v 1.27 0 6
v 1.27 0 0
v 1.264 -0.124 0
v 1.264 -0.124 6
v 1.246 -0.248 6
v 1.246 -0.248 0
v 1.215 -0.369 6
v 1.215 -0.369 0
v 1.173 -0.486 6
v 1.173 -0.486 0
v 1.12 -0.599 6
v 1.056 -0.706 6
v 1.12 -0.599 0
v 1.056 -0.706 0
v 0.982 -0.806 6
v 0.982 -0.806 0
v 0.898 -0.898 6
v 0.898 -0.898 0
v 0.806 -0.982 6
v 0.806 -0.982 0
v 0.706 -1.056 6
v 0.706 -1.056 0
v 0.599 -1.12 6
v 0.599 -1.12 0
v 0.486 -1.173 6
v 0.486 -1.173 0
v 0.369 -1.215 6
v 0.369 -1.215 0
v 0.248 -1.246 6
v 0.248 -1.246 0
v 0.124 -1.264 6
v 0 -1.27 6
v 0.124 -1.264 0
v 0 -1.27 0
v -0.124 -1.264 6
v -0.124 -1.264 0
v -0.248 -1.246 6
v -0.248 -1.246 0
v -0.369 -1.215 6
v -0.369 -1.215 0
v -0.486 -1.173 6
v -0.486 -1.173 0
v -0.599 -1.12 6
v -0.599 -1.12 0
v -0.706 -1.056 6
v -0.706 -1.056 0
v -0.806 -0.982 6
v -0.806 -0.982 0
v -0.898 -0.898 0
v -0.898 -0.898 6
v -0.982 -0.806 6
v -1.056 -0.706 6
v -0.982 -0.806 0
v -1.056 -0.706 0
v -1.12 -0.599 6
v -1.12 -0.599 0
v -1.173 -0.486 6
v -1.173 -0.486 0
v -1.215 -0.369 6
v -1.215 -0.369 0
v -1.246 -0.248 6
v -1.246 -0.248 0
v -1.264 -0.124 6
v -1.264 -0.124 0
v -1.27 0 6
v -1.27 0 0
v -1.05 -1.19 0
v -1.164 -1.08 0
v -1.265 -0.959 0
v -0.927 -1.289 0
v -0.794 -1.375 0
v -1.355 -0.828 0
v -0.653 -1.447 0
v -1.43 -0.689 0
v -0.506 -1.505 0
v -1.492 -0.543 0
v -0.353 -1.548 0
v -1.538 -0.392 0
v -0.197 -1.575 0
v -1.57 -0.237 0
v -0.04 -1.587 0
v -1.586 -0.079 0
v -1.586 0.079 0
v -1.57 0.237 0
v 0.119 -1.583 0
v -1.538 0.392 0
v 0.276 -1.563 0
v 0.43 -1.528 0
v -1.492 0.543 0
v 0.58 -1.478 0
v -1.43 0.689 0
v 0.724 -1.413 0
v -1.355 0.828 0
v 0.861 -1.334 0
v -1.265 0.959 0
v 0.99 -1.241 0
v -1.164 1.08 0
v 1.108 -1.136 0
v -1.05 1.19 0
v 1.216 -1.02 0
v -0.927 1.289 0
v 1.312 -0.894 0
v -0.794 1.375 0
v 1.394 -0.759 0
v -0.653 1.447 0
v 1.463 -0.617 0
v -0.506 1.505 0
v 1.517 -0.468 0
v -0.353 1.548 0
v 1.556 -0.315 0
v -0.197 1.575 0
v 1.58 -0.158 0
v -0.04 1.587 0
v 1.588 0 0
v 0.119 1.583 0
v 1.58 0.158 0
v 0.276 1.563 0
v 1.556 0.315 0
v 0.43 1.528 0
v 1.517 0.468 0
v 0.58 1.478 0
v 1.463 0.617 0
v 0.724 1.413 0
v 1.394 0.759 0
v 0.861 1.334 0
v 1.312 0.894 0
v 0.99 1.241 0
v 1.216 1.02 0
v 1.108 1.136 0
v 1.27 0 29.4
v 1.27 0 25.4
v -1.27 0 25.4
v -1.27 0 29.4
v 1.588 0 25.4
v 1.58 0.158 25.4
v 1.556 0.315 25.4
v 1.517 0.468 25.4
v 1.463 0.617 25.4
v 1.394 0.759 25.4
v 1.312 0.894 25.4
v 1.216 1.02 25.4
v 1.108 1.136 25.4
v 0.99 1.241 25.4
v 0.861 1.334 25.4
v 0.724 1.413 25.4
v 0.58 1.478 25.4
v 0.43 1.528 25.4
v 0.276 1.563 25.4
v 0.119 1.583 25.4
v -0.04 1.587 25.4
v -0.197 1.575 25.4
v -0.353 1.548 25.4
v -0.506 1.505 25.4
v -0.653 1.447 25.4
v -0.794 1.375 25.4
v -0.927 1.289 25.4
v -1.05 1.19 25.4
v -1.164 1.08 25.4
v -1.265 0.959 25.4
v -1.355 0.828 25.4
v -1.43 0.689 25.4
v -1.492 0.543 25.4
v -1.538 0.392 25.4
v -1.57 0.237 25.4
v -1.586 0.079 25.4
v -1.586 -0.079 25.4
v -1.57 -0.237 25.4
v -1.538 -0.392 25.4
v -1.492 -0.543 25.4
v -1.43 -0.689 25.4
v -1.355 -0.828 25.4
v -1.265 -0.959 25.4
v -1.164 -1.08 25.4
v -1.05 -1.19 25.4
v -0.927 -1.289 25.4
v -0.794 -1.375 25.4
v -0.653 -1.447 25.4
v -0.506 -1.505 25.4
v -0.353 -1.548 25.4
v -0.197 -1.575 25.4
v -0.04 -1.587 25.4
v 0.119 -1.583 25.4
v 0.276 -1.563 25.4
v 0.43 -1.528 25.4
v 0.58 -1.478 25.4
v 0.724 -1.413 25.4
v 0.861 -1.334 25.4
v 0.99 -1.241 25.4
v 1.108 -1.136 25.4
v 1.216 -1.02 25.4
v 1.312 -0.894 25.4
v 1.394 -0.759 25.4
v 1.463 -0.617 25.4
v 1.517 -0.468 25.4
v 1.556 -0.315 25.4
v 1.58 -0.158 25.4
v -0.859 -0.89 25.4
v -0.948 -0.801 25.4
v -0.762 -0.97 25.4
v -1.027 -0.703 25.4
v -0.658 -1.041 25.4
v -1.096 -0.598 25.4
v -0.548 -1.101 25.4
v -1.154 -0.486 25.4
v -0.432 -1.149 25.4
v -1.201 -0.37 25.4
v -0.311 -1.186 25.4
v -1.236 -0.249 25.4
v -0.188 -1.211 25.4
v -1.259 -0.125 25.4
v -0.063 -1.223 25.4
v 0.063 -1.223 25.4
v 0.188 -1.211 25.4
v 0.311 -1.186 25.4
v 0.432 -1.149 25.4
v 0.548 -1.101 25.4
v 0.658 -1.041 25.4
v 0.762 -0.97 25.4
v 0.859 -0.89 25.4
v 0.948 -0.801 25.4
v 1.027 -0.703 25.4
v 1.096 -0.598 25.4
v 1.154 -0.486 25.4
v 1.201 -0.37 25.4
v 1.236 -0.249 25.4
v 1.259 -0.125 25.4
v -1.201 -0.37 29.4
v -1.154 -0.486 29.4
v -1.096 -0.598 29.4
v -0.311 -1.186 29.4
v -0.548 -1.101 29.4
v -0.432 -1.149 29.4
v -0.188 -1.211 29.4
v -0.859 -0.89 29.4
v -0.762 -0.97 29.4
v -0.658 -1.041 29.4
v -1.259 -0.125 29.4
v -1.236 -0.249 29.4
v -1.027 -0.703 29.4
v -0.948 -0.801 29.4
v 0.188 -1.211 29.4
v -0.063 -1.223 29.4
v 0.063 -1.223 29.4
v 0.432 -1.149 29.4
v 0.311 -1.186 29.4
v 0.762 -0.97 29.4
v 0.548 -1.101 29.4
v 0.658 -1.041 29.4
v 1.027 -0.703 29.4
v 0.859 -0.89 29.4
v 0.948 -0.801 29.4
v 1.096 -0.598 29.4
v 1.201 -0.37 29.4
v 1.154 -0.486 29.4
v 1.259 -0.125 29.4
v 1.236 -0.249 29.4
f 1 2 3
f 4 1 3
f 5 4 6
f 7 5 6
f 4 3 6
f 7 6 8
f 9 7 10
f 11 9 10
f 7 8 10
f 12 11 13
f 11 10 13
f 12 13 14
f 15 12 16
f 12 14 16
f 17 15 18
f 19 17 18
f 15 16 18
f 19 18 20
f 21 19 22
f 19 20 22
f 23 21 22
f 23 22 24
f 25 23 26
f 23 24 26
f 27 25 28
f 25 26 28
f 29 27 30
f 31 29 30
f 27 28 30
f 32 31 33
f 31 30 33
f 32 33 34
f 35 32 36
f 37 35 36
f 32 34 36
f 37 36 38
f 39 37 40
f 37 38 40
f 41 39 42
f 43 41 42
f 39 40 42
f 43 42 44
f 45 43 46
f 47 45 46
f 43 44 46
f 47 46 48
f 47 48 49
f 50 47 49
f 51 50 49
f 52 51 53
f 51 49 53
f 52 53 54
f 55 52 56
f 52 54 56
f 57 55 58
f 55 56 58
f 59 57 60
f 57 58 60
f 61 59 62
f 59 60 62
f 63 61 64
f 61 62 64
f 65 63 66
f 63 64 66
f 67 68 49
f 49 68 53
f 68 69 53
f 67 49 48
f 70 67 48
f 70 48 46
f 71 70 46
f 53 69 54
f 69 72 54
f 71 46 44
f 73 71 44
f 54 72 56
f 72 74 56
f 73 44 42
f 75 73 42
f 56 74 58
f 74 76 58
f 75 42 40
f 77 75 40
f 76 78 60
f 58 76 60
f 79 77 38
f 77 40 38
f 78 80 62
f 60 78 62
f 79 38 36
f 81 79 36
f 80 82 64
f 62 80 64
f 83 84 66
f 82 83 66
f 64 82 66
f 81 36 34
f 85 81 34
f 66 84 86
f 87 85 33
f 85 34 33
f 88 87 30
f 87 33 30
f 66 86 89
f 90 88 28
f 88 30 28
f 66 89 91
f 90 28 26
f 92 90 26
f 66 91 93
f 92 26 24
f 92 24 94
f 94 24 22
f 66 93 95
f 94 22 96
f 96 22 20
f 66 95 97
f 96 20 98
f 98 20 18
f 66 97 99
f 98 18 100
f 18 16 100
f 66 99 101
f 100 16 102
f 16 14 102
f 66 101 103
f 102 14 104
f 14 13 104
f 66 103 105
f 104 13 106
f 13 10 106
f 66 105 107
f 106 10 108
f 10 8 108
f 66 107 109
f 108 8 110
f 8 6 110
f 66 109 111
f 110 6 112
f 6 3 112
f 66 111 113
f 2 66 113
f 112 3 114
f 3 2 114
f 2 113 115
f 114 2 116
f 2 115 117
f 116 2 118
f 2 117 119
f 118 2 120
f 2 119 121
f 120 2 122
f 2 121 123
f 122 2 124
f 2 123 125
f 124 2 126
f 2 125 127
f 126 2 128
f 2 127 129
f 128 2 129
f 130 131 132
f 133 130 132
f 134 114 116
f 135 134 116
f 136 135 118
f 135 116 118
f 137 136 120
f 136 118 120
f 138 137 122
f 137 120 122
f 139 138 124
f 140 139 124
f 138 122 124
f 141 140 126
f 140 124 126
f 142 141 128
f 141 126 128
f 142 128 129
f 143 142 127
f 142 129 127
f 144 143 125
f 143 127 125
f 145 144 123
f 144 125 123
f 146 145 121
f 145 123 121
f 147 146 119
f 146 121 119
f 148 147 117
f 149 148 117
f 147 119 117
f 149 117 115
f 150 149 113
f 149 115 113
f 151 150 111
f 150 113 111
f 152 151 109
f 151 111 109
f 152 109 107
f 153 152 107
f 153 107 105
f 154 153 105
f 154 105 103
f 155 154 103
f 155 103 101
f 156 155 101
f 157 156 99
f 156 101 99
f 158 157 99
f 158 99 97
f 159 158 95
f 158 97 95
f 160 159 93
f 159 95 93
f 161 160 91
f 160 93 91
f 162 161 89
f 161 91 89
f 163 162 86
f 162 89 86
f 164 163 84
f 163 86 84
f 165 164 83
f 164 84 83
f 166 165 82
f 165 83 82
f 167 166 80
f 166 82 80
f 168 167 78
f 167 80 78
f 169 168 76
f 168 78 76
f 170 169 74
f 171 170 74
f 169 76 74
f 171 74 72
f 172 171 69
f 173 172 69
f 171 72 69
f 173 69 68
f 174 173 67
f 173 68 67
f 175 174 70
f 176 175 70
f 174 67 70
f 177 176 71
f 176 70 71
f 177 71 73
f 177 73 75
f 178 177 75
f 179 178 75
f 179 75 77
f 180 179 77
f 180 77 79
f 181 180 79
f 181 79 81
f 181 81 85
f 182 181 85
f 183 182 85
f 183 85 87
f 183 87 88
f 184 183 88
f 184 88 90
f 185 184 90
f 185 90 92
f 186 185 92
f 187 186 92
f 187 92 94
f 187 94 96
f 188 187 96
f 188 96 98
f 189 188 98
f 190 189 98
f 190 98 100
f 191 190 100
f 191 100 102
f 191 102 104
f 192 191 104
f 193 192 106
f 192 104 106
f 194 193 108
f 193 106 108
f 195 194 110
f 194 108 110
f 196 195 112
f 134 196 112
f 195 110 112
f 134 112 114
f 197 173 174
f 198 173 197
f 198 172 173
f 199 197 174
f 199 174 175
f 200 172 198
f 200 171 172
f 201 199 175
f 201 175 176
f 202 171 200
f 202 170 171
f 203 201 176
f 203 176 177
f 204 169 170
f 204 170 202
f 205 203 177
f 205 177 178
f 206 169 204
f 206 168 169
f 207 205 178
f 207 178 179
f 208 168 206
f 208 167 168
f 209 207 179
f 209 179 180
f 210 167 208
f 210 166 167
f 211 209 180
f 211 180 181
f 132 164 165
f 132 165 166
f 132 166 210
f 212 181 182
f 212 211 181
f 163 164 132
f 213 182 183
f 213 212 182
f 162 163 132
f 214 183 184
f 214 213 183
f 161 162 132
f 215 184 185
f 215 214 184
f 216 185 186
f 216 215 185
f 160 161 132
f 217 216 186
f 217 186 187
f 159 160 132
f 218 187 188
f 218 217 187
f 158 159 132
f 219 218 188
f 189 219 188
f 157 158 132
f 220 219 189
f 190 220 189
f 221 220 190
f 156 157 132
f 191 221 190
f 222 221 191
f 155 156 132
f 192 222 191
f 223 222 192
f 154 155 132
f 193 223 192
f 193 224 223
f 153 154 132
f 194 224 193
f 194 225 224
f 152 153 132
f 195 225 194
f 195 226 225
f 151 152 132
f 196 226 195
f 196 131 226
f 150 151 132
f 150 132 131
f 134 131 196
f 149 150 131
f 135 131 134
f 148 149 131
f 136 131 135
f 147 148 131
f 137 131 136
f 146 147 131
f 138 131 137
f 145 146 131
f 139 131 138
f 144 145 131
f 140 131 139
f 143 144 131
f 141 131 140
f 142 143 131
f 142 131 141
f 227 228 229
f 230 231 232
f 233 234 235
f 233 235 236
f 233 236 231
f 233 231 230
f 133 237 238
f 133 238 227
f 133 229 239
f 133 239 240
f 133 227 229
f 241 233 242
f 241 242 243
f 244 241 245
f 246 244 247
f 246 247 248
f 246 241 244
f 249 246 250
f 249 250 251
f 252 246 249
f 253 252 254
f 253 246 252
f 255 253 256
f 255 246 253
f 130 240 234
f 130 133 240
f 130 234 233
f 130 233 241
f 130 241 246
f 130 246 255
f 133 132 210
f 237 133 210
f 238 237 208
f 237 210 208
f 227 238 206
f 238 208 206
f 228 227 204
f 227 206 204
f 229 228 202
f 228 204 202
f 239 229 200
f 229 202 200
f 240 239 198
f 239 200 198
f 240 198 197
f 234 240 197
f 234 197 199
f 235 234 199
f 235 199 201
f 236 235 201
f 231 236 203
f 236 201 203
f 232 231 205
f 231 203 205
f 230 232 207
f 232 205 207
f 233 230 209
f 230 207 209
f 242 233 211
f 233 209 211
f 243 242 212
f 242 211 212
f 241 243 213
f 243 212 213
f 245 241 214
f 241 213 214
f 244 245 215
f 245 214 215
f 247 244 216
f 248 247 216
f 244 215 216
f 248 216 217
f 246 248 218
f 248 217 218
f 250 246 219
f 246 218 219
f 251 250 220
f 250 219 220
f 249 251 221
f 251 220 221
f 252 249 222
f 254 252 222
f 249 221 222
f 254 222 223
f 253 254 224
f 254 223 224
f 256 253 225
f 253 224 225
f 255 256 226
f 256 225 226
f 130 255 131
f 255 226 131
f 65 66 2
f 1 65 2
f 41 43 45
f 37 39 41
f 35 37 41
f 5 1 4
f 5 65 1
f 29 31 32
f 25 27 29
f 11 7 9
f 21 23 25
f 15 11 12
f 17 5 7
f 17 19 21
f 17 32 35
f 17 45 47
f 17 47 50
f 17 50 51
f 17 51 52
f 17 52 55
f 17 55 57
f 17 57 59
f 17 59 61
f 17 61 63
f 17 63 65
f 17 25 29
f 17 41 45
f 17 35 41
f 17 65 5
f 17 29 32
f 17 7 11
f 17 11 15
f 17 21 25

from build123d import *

# Parameters (mm, degrees)
F0_R     = 1.5875
F1_DEPTH = 25.4
F3_DEPTH = 4
F5_DEPTH = 6


with BuildPart() as f1:
    # F0 (on Top) → F1 (new body)
    with BuildSketch(Plane.XY):
        Circle(F0_R)
    extrude(amount=F1_DEPTH)

    # F2 (on face) → F3 (join)
    with BuildSketch(Plane.XY.offset(25.4)):
        with BuildLine():
            ThreePointArc((-1.269985, 0), (0, -1.224553), (1.269985, 0))
            Line((1.269985, 0), (-1.269985, 0))
        make_face()
    extrude(amount=F3_DEPTH)

    # F4 (on face) → F5 (cut)
    with BuildSketch(Plane(origin=(0, 0, 0), x_dir=(1, 0, 0), z_dir=(0, 0, -1))):
        with BuildLine():
            ThreePointArc((1.27, 0), (0, 1.27), (-1.27, 0))
            Line((-1.27, 0), (1.27, 0))
        make_face()
    extrude(amount=-F5_DEPTH, mode=Mode.SUBTRACT)


solid = f1.part
